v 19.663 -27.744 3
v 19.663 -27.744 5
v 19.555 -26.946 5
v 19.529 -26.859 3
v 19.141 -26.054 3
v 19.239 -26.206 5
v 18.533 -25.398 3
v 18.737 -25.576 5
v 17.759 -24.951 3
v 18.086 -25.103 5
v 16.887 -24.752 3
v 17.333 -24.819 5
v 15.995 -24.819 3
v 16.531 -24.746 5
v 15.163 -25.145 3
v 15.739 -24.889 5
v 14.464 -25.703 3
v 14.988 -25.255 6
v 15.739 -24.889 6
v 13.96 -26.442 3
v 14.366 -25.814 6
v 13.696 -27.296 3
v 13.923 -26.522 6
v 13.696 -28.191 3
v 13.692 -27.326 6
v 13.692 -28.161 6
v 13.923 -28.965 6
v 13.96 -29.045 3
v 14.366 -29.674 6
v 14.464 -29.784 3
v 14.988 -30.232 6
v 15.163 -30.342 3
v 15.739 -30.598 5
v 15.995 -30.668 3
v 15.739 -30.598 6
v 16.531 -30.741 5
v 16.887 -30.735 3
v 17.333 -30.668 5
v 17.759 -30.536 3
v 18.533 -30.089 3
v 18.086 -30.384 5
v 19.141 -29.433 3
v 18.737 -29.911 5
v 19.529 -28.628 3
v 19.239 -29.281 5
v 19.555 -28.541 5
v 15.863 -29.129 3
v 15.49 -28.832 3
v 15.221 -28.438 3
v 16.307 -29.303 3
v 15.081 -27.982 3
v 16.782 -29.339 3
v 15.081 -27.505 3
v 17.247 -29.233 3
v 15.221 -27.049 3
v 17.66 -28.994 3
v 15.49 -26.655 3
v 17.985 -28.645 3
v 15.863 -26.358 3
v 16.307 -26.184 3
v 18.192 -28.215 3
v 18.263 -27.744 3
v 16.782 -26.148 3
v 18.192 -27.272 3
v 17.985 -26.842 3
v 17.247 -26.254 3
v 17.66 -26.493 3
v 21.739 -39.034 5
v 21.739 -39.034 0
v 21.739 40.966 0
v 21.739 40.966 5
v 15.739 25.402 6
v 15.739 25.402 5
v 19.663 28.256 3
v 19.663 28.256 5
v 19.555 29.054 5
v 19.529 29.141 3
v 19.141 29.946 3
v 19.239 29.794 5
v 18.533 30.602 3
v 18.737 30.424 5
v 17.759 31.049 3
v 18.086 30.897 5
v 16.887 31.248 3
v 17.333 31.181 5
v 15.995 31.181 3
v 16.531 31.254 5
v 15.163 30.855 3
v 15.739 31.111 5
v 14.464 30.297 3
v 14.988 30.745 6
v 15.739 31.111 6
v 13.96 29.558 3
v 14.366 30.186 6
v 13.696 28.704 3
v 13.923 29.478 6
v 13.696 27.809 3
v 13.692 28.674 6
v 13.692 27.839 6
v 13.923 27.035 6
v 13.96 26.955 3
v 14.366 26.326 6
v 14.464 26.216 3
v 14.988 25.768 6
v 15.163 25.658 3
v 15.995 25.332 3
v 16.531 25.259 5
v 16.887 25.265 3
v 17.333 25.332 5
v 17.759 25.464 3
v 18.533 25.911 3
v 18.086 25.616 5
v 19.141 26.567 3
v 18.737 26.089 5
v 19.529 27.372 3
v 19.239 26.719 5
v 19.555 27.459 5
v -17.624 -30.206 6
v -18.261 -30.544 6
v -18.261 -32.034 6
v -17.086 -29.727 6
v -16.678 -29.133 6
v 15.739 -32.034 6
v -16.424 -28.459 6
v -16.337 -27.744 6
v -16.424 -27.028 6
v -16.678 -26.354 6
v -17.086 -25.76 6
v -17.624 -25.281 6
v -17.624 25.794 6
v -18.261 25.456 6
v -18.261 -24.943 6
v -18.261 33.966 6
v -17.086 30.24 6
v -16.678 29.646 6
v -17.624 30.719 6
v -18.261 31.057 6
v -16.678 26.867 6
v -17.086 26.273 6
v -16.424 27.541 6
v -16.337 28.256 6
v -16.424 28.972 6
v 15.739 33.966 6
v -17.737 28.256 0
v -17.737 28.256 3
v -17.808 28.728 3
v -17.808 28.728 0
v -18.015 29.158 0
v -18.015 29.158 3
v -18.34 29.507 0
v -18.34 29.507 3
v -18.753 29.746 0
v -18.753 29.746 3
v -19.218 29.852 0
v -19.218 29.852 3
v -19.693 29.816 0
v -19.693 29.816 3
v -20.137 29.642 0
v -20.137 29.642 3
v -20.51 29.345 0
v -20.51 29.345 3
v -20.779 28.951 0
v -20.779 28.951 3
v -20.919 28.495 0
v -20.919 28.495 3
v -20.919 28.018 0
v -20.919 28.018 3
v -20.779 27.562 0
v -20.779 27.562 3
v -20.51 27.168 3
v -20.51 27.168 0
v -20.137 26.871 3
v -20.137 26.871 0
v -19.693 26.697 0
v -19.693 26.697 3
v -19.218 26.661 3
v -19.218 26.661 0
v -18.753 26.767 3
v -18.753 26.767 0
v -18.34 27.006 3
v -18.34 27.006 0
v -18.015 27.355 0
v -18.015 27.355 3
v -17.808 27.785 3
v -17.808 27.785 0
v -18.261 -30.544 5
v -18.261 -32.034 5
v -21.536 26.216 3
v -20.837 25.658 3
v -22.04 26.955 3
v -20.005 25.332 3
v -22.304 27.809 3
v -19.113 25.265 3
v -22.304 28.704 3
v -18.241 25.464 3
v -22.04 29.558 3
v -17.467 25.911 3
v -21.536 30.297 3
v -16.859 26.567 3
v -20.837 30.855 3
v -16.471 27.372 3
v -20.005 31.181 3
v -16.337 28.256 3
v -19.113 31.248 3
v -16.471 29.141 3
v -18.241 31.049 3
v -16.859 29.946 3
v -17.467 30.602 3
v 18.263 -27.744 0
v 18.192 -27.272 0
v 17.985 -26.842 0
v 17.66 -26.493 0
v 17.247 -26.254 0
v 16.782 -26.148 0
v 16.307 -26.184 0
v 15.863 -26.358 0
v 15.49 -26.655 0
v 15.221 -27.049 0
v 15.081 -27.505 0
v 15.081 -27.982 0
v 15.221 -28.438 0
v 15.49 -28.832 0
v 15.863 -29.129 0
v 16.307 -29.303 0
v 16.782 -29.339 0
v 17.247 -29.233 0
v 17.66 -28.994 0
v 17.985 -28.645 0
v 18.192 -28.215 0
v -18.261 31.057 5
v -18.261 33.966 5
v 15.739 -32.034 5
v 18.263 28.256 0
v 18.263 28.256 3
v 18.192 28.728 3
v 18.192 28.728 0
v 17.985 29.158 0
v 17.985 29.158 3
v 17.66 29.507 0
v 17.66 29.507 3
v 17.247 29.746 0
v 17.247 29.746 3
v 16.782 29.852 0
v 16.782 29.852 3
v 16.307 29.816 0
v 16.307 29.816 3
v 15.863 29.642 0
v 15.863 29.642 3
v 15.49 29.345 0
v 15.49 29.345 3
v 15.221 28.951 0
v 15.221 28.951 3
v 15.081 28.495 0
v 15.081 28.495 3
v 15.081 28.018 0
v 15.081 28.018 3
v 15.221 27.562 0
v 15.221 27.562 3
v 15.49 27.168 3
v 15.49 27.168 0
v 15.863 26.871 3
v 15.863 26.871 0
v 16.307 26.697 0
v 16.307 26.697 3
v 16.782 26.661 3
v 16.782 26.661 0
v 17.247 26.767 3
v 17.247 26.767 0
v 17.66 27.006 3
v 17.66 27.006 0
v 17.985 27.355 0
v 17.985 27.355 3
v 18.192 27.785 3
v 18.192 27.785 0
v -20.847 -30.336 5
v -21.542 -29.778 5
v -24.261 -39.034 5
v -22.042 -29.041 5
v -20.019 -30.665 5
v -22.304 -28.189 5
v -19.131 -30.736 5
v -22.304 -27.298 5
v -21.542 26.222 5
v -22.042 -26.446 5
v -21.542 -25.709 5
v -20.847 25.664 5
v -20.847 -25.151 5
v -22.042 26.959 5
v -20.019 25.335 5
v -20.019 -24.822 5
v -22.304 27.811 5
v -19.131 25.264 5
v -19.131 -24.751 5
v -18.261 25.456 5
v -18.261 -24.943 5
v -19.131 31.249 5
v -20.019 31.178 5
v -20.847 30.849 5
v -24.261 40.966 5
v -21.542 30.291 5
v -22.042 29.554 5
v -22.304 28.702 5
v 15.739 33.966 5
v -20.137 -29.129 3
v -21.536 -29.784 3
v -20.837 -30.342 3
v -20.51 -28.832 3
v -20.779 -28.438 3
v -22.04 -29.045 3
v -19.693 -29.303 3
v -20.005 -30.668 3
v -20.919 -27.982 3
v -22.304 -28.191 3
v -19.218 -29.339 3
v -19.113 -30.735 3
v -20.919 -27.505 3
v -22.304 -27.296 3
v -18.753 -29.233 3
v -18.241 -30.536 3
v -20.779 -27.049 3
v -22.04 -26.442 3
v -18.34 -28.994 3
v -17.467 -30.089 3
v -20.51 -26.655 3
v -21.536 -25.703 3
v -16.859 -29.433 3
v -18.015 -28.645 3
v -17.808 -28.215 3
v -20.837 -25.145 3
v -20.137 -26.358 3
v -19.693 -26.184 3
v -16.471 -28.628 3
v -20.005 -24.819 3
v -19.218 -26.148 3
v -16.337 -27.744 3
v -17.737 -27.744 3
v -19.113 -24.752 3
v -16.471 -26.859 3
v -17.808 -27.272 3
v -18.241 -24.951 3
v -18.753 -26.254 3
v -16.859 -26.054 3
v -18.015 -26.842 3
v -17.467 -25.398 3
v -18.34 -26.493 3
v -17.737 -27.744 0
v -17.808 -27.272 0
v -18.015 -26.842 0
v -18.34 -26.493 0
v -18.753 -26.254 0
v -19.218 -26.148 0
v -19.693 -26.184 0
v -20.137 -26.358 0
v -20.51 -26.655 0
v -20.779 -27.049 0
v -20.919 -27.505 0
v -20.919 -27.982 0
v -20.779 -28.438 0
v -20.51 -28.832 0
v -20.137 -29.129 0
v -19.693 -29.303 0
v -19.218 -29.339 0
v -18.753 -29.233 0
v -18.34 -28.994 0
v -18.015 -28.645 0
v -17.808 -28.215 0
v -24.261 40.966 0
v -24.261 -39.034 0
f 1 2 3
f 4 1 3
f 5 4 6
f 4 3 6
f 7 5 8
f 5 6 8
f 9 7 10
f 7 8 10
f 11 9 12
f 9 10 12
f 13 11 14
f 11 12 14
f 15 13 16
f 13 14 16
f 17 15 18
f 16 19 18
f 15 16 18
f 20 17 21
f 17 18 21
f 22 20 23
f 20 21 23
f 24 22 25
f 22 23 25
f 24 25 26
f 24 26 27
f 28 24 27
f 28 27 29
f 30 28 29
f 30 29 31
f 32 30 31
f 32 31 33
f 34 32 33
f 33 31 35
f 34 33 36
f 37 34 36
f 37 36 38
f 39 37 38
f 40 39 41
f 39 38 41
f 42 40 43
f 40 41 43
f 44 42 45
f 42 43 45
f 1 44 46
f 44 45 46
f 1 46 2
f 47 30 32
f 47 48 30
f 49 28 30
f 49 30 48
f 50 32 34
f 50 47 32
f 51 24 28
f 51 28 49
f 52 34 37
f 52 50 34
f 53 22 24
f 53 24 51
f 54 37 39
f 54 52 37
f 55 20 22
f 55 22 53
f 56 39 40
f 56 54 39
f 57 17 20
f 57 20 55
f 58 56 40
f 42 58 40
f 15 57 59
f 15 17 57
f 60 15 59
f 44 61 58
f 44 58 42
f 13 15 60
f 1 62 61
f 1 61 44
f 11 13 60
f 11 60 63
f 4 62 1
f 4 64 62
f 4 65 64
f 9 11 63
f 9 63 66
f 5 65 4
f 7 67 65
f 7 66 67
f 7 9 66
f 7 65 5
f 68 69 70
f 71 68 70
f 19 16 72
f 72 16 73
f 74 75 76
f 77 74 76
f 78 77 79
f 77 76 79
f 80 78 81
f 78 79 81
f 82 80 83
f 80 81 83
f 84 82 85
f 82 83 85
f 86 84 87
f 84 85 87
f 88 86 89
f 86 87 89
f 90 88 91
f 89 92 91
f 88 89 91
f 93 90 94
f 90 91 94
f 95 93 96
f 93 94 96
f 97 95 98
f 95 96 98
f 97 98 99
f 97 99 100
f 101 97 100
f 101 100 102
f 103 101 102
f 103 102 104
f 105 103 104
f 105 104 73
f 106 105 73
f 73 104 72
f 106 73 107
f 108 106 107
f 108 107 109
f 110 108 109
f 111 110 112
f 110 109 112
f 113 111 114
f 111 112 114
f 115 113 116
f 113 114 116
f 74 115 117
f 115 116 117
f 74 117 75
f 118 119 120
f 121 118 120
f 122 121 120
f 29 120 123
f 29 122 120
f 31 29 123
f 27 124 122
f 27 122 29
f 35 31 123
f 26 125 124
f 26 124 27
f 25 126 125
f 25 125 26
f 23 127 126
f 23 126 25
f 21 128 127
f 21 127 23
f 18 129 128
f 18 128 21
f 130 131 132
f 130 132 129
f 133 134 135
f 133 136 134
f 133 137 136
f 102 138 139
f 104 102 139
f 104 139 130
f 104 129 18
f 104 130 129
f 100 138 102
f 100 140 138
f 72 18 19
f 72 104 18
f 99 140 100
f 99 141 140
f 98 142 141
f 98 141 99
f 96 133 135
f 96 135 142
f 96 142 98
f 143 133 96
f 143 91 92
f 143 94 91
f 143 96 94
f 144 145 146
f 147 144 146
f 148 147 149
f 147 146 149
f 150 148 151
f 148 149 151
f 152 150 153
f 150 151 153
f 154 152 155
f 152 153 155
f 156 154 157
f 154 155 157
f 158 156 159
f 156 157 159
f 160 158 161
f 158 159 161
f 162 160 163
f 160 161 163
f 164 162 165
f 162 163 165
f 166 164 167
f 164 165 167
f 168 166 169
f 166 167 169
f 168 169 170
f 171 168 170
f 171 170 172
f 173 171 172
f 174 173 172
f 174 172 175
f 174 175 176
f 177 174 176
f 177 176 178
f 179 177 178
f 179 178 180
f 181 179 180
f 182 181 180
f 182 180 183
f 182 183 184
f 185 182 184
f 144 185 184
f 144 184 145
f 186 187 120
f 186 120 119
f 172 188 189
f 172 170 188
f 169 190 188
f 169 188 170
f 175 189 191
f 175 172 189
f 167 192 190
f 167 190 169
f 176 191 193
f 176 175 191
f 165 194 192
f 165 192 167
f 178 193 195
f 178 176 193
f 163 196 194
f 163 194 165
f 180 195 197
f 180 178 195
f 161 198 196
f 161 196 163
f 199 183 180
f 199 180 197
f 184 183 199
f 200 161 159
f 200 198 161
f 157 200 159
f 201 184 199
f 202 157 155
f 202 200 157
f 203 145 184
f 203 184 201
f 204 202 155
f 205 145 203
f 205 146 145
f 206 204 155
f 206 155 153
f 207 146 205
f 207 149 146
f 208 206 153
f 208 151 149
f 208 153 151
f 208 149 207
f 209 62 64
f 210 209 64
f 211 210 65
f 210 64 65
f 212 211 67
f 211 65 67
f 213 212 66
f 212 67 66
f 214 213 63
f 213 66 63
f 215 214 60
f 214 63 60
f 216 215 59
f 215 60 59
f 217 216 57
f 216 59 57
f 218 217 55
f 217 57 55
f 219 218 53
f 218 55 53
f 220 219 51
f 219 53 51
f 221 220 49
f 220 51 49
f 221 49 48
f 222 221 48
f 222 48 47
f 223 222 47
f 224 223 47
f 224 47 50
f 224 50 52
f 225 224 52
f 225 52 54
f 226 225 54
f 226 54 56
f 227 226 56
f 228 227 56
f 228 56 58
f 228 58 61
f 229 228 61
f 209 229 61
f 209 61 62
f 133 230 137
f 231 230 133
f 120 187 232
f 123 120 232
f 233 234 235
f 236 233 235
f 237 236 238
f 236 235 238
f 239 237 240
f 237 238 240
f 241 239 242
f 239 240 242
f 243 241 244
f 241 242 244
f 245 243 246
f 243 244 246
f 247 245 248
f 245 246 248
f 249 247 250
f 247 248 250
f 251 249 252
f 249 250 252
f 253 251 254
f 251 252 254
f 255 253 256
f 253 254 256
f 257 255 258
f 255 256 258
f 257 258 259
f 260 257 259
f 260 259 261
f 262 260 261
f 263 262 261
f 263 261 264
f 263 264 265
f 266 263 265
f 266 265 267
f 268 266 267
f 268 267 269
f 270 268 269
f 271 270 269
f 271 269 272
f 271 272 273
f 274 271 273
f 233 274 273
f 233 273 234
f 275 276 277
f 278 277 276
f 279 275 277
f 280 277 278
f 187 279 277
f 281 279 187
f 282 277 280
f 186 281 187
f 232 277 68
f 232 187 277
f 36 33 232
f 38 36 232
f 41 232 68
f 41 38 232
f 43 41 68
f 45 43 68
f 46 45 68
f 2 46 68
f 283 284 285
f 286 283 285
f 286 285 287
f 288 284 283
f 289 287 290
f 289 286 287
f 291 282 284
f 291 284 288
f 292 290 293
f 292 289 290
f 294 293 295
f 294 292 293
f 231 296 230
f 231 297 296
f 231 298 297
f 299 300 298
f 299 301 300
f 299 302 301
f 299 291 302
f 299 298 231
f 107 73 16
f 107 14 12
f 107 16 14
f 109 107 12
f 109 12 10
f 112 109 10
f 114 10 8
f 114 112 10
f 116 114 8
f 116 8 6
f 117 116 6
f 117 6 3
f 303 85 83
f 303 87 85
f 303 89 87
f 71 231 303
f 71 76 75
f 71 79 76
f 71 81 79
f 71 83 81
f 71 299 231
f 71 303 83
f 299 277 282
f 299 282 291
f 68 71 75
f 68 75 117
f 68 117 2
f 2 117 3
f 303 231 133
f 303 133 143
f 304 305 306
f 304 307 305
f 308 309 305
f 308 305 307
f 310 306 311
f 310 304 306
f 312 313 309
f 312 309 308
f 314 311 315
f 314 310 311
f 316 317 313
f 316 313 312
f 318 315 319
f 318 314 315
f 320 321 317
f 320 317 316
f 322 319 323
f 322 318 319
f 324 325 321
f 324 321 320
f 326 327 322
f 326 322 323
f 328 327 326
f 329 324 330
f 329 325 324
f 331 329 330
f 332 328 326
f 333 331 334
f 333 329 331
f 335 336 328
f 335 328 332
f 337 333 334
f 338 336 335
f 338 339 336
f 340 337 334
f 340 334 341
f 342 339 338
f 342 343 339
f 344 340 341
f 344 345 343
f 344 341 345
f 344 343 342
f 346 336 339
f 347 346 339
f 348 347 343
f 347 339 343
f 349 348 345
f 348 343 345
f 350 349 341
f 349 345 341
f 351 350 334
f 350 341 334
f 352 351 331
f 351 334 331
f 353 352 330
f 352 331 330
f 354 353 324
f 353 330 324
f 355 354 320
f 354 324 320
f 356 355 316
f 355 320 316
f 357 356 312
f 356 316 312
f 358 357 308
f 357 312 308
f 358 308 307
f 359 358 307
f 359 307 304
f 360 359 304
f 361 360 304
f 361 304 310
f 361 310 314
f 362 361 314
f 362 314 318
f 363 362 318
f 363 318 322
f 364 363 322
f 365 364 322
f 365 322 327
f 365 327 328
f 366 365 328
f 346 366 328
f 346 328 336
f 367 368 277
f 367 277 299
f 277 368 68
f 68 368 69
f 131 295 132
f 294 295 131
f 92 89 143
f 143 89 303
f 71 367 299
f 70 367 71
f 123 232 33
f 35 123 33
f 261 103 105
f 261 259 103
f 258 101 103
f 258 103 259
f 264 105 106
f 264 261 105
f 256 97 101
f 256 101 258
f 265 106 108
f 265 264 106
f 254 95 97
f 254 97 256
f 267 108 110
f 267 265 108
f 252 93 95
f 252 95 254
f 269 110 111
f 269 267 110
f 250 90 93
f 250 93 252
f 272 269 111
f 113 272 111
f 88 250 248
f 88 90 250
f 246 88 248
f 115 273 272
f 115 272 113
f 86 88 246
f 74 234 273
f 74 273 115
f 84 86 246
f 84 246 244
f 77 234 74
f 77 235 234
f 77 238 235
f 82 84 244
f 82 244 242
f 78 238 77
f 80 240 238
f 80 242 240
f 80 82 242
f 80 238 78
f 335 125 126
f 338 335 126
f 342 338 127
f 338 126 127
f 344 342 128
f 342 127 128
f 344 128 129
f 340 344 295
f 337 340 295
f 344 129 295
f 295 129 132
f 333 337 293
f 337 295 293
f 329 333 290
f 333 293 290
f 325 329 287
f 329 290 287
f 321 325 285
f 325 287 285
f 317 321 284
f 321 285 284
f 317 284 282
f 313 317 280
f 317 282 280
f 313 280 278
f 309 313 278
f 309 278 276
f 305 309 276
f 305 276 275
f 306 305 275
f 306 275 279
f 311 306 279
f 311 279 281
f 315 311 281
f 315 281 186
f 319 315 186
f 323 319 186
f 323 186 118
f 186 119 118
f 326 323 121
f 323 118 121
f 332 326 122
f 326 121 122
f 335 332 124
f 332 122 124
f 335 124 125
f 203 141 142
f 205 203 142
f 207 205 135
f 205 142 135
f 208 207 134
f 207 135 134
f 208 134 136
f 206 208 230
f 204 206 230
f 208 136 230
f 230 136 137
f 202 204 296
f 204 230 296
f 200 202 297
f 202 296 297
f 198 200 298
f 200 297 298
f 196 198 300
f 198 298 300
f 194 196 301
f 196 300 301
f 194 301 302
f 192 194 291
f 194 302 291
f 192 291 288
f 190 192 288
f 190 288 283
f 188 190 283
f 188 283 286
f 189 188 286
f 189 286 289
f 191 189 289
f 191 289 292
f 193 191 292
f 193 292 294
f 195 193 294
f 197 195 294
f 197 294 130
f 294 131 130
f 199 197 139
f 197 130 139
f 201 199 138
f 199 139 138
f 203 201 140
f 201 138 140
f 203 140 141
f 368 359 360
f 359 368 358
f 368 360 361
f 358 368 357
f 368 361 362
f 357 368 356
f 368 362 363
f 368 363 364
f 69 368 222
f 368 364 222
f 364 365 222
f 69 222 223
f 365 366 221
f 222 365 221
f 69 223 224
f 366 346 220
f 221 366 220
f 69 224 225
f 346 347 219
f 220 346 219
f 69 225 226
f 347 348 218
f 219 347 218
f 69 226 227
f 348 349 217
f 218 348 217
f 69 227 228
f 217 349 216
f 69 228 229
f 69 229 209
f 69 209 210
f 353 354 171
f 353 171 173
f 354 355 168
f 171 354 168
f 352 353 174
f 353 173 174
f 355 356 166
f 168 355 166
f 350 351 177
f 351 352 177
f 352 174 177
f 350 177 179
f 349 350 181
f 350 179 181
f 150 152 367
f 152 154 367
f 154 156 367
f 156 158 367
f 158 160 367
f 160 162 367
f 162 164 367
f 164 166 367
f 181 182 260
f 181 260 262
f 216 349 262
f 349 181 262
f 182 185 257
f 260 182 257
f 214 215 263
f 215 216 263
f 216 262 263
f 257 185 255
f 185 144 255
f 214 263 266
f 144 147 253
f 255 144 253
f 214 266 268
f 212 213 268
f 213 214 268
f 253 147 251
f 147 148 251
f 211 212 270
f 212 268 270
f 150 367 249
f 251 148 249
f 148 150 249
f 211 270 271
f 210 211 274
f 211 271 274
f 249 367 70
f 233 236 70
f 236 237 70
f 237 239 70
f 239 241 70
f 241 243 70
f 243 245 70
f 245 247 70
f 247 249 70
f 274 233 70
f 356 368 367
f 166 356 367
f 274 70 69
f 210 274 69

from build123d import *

# Parameters (mm, degrees)
F0_W     = 46
F0_H     = 80
F1_DEPTH = 5
F2_W     = 34
F2_H     = 66
F3_DEPTH = 1
F4_R     = 3
F5_DEPTH = 3
F6_R     = 1.6
F7_DEPTH = 6.001


with BuildPart() as f1:
    # F0 (on Top) → F1 (new body)
    with BuildSketch(Plane.XY):
        with Locations((-1.260705, 0.965576)):
            Rectangle(F0_W, F0_H)
    extrude(amount=F1_DEPTH)

    # F2 (on face) → F3 (join)
    with BuildSketch(Plane.XY.offset(5)):
        with Locations((-1.260705, 0.965576)):
            Rectangle(F2_W, F2_H)
    extrude(amount=F3_DEPTH)

    # F4 (on face) → F5 (cut)
    with BuildSketch(Plane.XY.offset(6)):
        with Locations((-19.337287, 28.25648)):
            Circle(F4_R)
        with Locations((16.662713, 28.25648)):
            Circle(F4_R)
        with Locations((-19.337287, -27.74352)):
            Circle(F4_R)
        with Locations((16.662713, -27.74352)):
            Circle(F4_R)
    extrude(amount=-F5_DEPTH, mode=Mode.SUBTRACT)

    # F6 (on face) → F7 (cut, through all)
    with BuildSketch(Plane.XY.offset(6)):
        with Locations((-19.337287, 28.25648)):
            Circle(F6_R)
        with Locations((16.662713, 28.25648)):
            Circle(F6_R)
        with Locations((-19.337287, -27.74352)):
            Circle(F6_R)
        with Locations((16.662713, -27.74352)):
            Circle(F6_R)
    extrude(amount=-F7_DEPTH, mode=Mode.SUBTRACT)


solid = f1.part
